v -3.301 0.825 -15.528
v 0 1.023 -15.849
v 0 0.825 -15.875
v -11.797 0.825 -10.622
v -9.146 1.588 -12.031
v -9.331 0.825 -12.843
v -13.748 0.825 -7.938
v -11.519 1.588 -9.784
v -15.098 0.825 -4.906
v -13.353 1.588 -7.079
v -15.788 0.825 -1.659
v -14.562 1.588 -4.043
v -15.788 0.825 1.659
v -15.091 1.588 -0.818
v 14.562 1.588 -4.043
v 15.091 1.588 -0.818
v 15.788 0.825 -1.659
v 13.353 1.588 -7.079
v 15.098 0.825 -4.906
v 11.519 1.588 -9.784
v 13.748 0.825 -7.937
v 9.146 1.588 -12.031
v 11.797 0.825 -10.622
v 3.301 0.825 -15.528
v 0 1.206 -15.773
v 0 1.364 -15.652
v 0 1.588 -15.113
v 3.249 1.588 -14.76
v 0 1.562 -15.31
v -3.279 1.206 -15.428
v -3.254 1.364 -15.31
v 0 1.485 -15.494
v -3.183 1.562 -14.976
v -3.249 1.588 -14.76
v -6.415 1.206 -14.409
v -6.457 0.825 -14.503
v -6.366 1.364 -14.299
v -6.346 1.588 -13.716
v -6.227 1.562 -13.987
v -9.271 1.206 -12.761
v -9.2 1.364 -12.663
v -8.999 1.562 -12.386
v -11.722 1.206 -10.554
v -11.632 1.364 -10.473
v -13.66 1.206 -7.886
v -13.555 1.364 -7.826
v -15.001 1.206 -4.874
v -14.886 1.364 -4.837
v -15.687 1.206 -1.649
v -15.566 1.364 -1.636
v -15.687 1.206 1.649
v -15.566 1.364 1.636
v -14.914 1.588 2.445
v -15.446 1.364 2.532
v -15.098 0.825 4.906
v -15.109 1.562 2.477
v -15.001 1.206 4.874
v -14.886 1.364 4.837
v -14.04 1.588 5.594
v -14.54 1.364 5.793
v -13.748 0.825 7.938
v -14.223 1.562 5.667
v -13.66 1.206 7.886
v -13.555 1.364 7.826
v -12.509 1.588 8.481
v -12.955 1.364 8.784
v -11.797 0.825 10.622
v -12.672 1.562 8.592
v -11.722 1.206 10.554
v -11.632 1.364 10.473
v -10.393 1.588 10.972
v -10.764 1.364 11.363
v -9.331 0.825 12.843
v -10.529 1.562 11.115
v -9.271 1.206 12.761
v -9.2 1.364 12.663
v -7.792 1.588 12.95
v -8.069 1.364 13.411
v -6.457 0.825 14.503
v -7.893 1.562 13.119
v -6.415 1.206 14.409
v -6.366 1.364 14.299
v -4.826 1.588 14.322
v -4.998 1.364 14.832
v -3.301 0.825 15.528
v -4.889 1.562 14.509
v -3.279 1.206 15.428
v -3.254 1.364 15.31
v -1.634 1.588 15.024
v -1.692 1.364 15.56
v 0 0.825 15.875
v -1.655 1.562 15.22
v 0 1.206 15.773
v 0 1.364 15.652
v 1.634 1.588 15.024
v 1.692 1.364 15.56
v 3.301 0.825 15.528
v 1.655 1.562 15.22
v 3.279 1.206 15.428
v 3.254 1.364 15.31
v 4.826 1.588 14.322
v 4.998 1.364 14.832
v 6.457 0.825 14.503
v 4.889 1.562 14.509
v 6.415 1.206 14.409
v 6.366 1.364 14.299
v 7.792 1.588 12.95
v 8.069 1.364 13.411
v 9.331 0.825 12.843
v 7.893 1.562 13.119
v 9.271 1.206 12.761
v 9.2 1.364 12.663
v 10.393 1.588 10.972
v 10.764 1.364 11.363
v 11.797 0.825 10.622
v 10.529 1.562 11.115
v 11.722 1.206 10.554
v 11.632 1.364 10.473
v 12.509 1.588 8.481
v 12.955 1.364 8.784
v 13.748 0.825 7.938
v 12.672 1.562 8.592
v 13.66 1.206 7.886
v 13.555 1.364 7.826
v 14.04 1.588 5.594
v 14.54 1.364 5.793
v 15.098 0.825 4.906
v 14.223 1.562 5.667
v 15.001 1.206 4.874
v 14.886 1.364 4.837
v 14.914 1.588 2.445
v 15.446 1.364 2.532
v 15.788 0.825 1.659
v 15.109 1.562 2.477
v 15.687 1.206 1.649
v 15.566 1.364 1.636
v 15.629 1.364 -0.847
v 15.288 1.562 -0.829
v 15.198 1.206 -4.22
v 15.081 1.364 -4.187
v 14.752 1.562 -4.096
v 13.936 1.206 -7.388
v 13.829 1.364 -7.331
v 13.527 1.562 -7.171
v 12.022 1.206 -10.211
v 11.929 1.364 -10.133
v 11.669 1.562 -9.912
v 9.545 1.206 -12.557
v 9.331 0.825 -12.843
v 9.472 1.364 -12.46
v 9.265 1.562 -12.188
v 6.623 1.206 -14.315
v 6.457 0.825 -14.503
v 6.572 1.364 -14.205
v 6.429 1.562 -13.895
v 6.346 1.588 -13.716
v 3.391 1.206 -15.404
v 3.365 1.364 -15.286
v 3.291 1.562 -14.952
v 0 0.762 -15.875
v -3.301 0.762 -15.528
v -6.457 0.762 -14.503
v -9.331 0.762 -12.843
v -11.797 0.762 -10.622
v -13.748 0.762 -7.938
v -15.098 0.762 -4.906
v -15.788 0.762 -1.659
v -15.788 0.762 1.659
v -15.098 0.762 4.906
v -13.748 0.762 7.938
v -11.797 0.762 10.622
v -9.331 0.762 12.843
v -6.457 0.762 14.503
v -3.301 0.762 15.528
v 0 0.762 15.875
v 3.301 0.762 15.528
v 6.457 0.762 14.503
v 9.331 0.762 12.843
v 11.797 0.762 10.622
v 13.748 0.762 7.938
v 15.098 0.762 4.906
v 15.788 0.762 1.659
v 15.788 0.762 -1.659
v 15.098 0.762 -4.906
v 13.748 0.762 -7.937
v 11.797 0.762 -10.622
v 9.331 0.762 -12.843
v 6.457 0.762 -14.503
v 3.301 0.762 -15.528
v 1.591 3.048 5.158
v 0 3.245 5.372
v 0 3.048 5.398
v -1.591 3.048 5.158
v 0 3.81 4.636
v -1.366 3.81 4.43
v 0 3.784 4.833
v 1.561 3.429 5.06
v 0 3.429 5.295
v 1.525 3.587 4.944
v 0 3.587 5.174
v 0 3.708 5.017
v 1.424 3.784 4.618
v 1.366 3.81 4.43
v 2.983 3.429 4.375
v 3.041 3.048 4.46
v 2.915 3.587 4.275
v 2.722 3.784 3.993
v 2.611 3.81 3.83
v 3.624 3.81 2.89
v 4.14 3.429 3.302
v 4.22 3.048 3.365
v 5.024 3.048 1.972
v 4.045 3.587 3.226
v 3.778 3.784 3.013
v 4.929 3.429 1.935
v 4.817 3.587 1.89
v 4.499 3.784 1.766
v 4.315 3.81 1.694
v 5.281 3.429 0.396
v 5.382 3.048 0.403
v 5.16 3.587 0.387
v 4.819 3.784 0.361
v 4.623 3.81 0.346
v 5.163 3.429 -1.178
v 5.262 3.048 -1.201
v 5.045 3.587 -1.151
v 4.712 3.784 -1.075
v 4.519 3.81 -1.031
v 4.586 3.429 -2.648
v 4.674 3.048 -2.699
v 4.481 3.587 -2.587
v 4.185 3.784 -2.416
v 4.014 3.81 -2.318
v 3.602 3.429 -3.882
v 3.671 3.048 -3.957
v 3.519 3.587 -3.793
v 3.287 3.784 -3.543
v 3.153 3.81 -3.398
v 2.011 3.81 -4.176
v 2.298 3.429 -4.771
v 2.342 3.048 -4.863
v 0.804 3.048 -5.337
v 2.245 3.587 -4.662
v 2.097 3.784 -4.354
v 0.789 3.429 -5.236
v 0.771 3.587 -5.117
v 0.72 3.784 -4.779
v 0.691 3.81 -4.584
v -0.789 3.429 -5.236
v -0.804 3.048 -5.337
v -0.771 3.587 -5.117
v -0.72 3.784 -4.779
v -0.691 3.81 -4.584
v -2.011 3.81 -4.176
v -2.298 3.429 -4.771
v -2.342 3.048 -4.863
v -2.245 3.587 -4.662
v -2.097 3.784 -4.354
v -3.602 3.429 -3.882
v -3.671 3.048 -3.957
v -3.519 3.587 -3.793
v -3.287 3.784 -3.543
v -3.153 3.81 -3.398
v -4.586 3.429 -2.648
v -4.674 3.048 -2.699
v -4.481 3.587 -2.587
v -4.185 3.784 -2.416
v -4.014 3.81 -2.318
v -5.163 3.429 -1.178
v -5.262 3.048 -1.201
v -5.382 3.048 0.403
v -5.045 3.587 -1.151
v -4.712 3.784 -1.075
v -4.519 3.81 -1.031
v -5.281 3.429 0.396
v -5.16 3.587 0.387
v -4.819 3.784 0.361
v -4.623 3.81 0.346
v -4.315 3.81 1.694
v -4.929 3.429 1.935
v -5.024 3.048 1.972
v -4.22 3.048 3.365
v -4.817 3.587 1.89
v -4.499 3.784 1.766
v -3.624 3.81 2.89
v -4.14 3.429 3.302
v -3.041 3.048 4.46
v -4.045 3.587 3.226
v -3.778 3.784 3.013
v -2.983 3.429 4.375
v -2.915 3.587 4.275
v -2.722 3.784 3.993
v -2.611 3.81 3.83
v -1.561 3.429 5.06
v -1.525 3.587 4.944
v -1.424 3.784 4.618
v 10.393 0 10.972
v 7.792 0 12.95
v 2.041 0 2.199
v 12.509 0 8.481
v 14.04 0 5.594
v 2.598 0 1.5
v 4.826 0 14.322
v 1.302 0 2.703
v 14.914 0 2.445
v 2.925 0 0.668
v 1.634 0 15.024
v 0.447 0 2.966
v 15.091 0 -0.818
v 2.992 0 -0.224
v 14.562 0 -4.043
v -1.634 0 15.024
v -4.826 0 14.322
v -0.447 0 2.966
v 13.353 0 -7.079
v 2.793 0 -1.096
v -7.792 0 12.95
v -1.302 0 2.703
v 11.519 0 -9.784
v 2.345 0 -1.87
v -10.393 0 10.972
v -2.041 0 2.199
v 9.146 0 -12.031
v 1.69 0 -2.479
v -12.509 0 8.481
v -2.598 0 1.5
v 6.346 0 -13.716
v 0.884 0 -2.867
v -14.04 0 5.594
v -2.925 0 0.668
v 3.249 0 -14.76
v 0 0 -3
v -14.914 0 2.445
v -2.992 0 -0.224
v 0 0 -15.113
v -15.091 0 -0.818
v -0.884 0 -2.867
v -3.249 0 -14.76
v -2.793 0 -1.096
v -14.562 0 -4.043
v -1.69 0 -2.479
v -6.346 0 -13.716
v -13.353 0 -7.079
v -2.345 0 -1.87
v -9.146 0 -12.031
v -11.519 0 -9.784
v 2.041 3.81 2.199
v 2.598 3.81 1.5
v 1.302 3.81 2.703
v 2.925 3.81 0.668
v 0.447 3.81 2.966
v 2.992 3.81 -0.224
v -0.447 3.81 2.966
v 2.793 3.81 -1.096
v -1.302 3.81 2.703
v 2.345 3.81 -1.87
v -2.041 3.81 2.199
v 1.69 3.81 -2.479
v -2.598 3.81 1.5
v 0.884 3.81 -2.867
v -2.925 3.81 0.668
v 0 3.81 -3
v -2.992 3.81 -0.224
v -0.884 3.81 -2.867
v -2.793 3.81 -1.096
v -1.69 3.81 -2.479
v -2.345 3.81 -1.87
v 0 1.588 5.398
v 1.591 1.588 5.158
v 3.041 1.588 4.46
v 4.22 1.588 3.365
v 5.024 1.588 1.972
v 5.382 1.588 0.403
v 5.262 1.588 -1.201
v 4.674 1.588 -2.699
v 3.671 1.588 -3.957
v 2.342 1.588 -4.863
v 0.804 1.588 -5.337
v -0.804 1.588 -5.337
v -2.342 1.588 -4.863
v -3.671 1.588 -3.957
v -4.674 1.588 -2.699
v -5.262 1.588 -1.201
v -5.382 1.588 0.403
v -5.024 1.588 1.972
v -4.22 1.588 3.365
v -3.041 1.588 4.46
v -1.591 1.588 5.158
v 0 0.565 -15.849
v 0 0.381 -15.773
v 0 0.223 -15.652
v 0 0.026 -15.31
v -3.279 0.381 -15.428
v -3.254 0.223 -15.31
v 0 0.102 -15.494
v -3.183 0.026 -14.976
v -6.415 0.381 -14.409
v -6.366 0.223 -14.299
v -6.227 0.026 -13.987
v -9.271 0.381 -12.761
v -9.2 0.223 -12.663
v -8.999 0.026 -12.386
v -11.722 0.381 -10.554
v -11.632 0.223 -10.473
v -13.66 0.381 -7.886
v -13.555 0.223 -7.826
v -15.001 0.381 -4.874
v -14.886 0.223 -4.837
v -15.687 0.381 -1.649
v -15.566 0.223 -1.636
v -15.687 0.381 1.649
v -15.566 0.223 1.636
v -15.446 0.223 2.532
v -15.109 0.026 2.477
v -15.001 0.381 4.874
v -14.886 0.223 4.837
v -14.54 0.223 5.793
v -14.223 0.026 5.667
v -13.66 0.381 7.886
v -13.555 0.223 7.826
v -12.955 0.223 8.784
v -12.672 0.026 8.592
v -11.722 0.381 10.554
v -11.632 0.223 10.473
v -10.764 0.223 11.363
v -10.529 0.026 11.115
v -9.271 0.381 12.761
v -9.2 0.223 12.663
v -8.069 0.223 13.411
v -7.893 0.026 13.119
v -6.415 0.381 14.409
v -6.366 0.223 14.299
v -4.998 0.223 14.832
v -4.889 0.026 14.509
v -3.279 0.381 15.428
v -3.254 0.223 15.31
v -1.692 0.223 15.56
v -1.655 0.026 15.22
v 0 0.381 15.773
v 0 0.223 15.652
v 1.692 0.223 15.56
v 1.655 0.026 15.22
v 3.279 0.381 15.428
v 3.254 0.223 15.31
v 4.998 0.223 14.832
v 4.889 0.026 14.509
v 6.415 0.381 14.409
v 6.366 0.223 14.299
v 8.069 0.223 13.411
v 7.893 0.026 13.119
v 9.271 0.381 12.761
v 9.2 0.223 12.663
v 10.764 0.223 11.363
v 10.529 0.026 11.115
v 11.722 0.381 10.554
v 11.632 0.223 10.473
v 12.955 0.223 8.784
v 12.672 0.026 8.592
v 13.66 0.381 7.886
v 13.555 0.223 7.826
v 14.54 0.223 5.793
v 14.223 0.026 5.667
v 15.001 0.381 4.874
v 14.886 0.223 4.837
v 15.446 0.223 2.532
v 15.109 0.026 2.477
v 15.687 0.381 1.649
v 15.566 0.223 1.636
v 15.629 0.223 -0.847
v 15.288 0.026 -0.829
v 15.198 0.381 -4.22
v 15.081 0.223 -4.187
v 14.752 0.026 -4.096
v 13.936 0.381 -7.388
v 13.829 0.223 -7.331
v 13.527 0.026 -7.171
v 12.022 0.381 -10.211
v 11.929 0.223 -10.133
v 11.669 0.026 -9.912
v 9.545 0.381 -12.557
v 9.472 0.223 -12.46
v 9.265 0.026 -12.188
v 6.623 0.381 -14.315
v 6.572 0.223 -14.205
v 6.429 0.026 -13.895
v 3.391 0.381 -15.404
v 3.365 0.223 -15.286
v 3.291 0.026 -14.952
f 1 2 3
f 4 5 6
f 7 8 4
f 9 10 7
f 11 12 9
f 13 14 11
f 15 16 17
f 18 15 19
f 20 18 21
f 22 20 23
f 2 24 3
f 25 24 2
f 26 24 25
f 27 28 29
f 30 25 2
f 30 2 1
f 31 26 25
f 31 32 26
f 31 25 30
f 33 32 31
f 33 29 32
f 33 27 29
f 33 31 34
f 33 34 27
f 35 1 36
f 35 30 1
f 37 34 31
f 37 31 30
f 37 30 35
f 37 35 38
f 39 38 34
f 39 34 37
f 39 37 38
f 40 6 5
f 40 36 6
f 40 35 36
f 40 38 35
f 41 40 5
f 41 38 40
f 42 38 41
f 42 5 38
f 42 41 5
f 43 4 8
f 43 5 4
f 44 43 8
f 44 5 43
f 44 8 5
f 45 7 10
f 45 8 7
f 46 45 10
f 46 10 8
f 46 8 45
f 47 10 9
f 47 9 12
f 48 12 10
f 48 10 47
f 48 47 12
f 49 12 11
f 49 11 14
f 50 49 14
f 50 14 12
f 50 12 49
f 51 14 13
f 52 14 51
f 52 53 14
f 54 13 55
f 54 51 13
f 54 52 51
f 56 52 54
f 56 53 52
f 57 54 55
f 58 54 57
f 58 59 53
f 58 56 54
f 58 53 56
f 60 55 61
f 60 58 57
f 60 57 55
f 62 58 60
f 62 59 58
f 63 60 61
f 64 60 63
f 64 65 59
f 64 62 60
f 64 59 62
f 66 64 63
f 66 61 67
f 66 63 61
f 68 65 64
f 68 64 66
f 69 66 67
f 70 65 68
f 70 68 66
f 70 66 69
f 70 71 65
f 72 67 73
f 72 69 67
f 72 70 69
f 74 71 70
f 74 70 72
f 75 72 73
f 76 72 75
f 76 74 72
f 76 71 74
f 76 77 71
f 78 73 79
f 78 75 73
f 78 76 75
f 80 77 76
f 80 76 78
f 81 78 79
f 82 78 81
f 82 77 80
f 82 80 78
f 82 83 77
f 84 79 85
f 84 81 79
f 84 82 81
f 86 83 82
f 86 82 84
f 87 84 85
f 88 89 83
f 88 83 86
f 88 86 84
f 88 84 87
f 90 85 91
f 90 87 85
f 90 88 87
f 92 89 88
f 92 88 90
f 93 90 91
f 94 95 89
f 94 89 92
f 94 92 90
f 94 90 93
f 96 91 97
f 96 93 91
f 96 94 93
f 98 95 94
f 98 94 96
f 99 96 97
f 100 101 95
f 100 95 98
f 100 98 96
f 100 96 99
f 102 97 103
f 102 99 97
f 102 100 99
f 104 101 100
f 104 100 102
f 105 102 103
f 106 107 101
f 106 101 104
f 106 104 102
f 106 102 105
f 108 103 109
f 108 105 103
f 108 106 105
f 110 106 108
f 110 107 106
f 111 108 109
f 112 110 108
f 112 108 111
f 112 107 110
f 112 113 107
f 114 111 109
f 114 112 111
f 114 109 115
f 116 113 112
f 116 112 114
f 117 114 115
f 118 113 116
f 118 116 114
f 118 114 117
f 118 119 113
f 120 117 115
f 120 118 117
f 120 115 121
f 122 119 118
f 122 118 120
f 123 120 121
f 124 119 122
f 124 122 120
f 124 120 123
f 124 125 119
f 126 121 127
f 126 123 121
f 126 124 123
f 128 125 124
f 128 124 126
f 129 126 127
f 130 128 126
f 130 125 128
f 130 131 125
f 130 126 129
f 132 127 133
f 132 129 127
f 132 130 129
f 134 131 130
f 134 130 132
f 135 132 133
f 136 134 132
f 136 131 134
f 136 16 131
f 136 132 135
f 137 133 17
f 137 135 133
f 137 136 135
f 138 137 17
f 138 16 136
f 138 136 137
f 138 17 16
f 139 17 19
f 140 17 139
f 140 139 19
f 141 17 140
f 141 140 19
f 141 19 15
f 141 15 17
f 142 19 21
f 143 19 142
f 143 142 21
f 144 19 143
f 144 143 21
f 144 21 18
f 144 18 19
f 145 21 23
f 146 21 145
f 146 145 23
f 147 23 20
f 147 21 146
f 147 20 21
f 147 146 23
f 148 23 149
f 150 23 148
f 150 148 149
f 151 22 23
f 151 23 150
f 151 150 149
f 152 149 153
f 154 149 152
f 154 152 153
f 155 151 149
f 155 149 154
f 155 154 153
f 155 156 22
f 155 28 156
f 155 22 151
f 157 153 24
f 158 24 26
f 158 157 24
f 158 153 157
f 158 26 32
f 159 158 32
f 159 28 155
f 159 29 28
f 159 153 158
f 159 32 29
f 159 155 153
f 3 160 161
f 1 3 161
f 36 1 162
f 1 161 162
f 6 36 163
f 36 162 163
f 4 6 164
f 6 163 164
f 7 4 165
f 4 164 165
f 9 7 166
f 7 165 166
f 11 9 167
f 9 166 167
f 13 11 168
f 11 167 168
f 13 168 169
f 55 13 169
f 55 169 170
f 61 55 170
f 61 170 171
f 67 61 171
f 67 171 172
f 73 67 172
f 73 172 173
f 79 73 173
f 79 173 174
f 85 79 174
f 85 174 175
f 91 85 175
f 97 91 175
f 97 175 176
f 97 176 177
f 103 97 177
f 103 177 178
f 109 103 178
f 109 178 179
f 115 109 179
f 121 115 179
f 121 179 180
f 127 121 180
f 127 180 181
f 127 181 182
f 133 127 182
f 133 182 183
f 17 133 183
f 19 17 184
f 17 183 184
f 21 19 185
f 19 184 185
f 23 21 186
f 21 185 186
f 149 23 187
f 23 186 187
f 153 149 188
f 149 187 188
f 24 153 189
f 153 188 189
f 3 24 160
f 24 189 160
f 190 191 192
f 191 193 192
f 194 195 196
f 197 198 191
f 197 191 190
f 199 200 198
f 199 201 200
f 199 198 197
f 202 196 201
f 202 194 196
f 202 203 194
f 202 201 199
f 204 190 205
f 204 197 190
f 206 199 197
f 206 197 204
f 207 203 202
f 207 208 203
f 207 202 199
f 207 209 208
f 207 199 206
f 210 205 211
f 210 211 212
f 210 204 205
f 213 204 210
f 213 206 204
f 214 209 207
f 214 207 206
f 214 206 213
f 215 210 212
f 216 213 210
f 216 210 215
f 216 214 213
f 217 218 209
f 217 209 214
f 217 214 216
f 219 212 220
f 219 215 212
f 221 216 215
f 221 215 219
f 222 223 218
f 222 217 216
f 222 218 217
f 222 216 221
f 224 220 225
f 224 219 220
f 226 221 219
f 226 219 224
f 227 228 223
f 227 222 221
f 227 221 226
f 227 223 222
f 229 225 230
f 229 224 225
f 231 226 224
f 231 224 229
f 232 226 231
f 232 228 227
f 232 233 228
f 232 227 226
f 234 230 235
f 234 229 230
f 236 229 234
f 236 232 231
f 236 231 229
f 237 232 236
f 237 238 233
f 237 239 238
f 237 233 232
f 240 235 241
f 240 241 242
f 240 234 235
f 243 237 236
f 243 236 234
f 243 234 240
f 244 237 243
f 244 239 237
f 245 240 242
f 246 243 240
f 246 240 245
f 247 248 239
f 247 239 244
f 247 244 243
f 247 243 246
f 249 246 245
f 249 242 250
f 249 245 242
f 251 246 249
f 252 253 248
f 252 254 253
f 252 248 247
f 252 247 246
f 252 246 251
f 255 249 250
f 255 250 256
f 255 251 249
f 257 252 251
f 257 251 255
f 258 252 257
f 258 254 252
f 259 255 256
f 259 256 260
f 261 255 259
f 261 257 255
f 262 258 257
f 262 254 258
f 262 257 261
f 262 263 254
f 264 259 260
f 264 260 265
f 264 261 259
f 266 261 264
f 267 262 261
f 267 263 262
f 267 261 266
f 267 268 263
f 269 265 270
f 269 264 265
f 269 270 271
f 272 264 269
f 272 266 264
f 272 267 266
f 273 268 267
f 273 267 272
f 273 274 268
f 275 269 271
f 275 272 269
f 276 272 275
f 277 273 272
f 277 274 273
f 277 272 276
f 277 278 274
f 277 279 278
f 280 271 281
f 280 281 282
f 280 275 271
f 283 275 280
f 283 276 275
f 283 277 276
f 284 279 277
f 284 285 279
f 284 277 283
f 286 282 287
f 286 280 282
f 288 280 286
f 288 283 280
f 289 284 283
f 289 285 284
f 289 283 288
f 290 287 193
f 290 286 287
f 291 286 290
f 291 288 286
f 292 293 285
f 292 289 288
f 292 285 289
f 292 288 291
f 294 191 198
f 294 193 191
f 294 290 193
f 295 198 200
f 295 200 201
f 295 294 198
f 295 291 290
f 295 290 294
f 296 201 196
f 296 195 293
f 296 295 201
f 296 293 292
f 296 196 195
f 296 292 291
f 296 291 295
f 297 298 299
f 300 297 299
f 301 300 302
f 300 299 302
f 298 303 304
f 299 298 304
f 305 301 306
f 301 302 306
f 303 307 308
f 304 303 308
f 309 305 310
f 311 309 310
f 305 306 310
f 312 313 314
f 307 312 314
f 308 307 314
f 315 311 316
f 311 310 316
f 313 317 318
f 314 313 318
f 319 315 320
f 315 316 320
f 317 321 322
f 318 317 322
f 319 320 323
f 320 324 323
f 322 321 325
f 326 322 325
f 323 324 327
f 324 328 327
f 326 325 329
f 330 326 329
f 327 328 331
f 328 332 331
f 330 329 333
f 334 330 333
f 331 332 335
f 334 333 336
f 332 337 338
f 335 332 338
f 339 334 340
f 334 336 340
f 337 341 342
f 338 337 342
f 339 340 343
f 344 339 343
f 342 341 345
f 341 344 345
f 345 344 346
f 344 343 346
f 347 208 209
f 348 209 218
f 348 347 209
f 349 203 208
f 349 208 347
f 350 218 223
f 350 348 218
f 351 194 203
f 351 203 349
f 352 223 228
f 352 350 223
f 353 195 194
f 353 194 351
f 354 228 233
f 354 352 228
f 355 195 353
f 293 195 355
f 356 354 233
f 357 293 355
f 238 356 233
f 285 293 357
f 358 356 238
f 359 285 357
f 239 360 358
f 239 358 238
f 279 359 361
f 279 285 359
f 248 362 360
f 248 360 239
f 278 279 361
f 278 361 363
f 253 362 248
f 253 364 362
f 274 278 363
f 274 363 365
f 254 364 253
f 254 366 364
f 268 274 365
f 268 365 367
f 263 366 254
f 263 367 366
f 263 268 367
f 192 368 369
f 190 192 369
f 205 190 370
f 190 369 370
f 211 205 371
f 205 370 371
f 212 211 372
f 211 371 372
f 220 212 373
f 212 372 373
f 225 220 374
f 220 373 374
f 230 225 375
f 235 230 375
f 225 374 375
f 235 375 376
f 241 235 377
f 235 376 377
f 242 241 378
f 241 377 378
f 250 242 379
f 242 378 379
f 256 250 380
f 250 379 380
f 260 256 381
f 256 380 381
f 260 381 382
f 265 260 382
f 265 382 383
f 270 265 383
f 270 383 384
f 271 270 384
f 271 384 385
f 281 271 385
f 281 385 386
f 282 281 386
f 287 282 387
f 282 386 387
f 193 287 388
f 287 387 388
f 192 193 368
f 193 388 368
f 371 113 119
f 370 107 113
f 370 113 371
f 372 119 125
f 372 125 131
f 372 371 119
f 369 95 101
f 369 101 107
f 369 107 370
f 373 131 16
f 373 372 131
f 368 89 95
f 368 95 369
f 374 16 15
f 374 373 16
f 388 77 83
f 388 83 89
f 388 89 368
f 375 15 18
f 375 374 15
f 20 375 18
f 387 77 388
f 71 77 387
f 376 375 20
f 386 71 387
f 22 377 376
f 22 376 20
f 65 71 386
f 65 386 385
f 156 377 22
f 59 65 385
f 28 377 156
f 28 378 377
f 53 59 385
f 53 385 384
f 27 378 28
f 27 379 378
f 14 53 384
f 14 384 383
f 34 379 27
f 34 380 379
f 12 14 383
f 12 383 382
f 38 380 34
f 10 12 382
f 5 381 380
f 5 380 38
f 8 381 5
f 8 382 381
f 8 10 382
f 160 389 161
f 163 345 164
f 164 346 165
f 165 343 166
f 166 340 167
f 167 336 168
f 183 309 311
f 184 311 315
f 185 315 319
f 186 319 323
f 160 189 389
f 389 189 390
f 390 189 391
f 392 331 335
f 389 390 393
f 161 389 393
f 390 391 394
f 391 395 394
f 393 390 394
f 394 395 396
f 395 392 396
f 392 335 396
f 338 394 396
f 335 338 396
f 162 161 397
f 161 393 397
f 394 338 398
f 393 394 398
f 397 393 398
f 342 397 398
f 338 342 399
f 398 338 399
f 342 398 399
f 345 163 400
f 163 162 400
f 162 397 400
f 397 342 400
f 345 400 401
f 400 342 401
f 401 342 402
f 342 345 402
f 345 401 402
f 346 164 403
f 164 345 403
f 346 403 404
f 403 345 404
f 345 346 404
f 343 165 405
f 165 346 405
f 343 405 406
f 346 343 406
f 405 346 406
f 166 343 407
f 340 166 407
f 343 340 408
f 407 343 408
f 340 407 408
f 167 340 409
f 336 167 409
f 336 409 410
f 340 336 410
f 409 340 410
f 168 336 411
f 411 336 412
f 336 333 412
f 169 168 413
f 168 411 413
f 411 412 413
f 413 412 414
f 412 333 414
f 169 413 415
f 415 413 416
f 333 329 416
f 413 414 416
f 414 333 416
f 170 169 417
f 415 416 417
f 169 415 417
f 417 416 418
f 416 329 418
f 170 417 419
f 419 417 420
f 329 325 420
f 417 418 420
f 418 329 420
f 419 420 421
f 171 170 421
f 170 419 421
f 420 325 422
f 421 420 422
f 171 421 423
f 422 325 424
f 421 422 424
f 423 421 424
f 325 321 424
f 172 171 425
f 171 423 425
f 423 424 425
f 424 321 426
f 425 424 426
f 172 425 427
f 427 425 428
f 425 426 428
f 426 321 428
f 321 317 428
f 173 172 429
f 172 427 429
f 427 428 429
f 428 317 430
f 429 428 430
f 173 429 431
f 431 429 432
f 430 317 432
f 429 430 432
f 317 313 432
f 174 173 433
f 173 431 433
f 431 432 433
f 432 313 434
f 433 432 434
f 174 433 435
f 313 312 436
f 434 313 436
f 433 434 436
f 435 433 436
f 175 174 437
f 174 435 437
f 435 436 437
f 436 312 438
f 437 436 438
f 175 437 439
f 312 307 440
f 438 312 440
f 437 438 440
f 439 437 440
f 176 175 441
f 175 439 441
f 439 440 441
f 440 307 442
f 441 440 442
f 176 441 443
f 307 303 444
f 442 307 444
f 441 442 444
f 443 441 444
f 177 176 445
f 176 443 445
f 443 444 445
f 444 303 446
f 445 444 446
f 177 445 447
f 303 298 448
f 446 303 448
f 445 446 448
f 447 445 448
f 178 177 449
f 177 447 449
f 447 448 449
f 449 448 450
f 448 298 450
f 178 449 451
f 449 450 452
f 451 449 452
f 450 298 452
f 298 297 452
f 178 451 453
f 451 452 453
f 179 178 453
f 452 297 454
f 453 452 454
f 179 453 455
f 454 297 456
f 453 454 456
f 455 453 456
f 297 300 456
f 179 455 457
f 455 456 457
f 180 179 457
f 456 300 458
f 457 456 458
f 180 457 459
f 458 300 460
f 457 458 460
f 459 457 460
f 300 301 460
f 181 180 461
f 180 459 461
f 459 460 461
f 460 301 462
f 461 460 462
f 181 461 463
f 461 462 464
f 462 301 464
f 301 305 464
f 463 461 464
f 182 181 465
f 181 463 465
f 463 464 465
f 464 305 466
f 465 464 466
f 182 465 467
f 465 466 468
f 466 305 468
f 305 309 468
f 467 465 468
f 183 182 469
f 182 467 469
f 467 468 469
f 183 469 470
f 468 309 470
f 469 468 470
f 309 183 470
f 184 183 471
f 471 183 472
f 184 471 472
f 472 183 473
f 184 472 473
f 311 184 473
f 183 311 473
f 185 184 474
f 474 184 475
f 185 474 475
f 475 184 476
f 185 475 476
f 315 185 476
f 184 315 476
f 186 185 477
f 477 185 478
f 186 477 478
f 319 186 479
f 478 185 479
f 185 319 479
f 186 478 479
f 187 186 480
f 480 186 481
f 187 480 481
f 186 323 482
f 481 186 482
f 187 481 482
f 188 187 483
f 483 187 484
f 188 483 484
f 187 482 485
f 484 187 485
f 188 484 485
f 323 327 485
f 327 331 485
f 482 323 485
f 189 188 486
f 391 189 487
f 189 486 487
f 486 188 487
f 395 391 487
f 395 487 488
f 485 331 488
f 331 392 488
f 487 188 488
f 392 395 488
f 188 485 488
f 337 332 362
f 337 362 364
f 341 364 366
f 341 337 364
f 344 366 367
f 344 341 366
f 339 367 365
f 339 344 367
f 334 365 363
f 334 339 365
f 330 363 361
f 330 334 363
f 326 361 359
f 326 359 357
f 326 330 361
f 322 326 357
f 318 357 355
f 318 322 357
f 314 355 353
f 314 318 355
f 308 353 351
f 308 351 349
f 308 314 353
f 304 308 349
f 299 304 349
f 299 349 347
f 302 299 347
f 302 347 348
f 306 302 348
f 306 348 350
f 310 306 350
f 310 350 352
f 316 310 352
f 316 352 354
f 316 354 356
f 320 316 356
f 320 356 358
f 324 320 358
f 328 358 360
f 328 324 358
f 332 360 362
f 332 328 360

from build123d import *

# Parameters (mm, degrees)
SKETCH1_R           = 15.875
SKETCH1_R_2         = 3
BOSS_EXTRUDE1_DEPTH = 3.81
CUT_EXTRUDE1_START  = -2.2225
SKETCH2_R           = 15.875
SKETCH2_R_2         = 5.3975
CUT_EXTRUDE1_DEPTH  = 2.2225
FILLET1_R           = 0.762


with BuildPart() as part:
    # Sketch1 → Boss-Extrude1 (new body)
    with BuildSketch(Plane(origin=(0, 0, 0), x_dir=(1, 0, 0), z_dir=(0, 1, 0))):
        with Locations(Location((0, 0, 0), (0, 0, 90))):
            Circle(SKETCH1_R)
        with Locations(Location((0, 0, 0), (0, 0, 90))):
            Circle(SKETCH1_R_2, mode=Mode.SUBTRACT)
    extrude(amount=BOSS_EXTRUDE1_DEPTH)

    # Sketch2 → Cut-Extrude1 (cut)
    with BuildSketch(Plane(origin=(0, 3.81, 0), x_dir=(1, 0, 0), z_dir=(0, 1, 0)).offset(CUT_EXTRUDE1_START)):
        with Locations(Location((0, 0, 0), (0, 0, 90))):
            Circle(SKETCH2_R)
        with Locations(Location((0, 0, 0), (0, 0, 270))):
            Circle(SKETCH2_R_2, mode=Mode.SUBTRACT)
    extrude(amount=CUT_EXTRUDE1_DEPTH, mode=Mode.SUBTRACT)

    # Fillet1
    fillet1_edges = [part.edges().sort_by_distance(p)[0] for p in [
        (0, 3.81, -5.3975),
        (0, 1.5875, 15.875),
        (0, 0, 15.875),
    ]]
    fillet(fillet1_edges, radius=FILLET1_R)


solid = part.part
